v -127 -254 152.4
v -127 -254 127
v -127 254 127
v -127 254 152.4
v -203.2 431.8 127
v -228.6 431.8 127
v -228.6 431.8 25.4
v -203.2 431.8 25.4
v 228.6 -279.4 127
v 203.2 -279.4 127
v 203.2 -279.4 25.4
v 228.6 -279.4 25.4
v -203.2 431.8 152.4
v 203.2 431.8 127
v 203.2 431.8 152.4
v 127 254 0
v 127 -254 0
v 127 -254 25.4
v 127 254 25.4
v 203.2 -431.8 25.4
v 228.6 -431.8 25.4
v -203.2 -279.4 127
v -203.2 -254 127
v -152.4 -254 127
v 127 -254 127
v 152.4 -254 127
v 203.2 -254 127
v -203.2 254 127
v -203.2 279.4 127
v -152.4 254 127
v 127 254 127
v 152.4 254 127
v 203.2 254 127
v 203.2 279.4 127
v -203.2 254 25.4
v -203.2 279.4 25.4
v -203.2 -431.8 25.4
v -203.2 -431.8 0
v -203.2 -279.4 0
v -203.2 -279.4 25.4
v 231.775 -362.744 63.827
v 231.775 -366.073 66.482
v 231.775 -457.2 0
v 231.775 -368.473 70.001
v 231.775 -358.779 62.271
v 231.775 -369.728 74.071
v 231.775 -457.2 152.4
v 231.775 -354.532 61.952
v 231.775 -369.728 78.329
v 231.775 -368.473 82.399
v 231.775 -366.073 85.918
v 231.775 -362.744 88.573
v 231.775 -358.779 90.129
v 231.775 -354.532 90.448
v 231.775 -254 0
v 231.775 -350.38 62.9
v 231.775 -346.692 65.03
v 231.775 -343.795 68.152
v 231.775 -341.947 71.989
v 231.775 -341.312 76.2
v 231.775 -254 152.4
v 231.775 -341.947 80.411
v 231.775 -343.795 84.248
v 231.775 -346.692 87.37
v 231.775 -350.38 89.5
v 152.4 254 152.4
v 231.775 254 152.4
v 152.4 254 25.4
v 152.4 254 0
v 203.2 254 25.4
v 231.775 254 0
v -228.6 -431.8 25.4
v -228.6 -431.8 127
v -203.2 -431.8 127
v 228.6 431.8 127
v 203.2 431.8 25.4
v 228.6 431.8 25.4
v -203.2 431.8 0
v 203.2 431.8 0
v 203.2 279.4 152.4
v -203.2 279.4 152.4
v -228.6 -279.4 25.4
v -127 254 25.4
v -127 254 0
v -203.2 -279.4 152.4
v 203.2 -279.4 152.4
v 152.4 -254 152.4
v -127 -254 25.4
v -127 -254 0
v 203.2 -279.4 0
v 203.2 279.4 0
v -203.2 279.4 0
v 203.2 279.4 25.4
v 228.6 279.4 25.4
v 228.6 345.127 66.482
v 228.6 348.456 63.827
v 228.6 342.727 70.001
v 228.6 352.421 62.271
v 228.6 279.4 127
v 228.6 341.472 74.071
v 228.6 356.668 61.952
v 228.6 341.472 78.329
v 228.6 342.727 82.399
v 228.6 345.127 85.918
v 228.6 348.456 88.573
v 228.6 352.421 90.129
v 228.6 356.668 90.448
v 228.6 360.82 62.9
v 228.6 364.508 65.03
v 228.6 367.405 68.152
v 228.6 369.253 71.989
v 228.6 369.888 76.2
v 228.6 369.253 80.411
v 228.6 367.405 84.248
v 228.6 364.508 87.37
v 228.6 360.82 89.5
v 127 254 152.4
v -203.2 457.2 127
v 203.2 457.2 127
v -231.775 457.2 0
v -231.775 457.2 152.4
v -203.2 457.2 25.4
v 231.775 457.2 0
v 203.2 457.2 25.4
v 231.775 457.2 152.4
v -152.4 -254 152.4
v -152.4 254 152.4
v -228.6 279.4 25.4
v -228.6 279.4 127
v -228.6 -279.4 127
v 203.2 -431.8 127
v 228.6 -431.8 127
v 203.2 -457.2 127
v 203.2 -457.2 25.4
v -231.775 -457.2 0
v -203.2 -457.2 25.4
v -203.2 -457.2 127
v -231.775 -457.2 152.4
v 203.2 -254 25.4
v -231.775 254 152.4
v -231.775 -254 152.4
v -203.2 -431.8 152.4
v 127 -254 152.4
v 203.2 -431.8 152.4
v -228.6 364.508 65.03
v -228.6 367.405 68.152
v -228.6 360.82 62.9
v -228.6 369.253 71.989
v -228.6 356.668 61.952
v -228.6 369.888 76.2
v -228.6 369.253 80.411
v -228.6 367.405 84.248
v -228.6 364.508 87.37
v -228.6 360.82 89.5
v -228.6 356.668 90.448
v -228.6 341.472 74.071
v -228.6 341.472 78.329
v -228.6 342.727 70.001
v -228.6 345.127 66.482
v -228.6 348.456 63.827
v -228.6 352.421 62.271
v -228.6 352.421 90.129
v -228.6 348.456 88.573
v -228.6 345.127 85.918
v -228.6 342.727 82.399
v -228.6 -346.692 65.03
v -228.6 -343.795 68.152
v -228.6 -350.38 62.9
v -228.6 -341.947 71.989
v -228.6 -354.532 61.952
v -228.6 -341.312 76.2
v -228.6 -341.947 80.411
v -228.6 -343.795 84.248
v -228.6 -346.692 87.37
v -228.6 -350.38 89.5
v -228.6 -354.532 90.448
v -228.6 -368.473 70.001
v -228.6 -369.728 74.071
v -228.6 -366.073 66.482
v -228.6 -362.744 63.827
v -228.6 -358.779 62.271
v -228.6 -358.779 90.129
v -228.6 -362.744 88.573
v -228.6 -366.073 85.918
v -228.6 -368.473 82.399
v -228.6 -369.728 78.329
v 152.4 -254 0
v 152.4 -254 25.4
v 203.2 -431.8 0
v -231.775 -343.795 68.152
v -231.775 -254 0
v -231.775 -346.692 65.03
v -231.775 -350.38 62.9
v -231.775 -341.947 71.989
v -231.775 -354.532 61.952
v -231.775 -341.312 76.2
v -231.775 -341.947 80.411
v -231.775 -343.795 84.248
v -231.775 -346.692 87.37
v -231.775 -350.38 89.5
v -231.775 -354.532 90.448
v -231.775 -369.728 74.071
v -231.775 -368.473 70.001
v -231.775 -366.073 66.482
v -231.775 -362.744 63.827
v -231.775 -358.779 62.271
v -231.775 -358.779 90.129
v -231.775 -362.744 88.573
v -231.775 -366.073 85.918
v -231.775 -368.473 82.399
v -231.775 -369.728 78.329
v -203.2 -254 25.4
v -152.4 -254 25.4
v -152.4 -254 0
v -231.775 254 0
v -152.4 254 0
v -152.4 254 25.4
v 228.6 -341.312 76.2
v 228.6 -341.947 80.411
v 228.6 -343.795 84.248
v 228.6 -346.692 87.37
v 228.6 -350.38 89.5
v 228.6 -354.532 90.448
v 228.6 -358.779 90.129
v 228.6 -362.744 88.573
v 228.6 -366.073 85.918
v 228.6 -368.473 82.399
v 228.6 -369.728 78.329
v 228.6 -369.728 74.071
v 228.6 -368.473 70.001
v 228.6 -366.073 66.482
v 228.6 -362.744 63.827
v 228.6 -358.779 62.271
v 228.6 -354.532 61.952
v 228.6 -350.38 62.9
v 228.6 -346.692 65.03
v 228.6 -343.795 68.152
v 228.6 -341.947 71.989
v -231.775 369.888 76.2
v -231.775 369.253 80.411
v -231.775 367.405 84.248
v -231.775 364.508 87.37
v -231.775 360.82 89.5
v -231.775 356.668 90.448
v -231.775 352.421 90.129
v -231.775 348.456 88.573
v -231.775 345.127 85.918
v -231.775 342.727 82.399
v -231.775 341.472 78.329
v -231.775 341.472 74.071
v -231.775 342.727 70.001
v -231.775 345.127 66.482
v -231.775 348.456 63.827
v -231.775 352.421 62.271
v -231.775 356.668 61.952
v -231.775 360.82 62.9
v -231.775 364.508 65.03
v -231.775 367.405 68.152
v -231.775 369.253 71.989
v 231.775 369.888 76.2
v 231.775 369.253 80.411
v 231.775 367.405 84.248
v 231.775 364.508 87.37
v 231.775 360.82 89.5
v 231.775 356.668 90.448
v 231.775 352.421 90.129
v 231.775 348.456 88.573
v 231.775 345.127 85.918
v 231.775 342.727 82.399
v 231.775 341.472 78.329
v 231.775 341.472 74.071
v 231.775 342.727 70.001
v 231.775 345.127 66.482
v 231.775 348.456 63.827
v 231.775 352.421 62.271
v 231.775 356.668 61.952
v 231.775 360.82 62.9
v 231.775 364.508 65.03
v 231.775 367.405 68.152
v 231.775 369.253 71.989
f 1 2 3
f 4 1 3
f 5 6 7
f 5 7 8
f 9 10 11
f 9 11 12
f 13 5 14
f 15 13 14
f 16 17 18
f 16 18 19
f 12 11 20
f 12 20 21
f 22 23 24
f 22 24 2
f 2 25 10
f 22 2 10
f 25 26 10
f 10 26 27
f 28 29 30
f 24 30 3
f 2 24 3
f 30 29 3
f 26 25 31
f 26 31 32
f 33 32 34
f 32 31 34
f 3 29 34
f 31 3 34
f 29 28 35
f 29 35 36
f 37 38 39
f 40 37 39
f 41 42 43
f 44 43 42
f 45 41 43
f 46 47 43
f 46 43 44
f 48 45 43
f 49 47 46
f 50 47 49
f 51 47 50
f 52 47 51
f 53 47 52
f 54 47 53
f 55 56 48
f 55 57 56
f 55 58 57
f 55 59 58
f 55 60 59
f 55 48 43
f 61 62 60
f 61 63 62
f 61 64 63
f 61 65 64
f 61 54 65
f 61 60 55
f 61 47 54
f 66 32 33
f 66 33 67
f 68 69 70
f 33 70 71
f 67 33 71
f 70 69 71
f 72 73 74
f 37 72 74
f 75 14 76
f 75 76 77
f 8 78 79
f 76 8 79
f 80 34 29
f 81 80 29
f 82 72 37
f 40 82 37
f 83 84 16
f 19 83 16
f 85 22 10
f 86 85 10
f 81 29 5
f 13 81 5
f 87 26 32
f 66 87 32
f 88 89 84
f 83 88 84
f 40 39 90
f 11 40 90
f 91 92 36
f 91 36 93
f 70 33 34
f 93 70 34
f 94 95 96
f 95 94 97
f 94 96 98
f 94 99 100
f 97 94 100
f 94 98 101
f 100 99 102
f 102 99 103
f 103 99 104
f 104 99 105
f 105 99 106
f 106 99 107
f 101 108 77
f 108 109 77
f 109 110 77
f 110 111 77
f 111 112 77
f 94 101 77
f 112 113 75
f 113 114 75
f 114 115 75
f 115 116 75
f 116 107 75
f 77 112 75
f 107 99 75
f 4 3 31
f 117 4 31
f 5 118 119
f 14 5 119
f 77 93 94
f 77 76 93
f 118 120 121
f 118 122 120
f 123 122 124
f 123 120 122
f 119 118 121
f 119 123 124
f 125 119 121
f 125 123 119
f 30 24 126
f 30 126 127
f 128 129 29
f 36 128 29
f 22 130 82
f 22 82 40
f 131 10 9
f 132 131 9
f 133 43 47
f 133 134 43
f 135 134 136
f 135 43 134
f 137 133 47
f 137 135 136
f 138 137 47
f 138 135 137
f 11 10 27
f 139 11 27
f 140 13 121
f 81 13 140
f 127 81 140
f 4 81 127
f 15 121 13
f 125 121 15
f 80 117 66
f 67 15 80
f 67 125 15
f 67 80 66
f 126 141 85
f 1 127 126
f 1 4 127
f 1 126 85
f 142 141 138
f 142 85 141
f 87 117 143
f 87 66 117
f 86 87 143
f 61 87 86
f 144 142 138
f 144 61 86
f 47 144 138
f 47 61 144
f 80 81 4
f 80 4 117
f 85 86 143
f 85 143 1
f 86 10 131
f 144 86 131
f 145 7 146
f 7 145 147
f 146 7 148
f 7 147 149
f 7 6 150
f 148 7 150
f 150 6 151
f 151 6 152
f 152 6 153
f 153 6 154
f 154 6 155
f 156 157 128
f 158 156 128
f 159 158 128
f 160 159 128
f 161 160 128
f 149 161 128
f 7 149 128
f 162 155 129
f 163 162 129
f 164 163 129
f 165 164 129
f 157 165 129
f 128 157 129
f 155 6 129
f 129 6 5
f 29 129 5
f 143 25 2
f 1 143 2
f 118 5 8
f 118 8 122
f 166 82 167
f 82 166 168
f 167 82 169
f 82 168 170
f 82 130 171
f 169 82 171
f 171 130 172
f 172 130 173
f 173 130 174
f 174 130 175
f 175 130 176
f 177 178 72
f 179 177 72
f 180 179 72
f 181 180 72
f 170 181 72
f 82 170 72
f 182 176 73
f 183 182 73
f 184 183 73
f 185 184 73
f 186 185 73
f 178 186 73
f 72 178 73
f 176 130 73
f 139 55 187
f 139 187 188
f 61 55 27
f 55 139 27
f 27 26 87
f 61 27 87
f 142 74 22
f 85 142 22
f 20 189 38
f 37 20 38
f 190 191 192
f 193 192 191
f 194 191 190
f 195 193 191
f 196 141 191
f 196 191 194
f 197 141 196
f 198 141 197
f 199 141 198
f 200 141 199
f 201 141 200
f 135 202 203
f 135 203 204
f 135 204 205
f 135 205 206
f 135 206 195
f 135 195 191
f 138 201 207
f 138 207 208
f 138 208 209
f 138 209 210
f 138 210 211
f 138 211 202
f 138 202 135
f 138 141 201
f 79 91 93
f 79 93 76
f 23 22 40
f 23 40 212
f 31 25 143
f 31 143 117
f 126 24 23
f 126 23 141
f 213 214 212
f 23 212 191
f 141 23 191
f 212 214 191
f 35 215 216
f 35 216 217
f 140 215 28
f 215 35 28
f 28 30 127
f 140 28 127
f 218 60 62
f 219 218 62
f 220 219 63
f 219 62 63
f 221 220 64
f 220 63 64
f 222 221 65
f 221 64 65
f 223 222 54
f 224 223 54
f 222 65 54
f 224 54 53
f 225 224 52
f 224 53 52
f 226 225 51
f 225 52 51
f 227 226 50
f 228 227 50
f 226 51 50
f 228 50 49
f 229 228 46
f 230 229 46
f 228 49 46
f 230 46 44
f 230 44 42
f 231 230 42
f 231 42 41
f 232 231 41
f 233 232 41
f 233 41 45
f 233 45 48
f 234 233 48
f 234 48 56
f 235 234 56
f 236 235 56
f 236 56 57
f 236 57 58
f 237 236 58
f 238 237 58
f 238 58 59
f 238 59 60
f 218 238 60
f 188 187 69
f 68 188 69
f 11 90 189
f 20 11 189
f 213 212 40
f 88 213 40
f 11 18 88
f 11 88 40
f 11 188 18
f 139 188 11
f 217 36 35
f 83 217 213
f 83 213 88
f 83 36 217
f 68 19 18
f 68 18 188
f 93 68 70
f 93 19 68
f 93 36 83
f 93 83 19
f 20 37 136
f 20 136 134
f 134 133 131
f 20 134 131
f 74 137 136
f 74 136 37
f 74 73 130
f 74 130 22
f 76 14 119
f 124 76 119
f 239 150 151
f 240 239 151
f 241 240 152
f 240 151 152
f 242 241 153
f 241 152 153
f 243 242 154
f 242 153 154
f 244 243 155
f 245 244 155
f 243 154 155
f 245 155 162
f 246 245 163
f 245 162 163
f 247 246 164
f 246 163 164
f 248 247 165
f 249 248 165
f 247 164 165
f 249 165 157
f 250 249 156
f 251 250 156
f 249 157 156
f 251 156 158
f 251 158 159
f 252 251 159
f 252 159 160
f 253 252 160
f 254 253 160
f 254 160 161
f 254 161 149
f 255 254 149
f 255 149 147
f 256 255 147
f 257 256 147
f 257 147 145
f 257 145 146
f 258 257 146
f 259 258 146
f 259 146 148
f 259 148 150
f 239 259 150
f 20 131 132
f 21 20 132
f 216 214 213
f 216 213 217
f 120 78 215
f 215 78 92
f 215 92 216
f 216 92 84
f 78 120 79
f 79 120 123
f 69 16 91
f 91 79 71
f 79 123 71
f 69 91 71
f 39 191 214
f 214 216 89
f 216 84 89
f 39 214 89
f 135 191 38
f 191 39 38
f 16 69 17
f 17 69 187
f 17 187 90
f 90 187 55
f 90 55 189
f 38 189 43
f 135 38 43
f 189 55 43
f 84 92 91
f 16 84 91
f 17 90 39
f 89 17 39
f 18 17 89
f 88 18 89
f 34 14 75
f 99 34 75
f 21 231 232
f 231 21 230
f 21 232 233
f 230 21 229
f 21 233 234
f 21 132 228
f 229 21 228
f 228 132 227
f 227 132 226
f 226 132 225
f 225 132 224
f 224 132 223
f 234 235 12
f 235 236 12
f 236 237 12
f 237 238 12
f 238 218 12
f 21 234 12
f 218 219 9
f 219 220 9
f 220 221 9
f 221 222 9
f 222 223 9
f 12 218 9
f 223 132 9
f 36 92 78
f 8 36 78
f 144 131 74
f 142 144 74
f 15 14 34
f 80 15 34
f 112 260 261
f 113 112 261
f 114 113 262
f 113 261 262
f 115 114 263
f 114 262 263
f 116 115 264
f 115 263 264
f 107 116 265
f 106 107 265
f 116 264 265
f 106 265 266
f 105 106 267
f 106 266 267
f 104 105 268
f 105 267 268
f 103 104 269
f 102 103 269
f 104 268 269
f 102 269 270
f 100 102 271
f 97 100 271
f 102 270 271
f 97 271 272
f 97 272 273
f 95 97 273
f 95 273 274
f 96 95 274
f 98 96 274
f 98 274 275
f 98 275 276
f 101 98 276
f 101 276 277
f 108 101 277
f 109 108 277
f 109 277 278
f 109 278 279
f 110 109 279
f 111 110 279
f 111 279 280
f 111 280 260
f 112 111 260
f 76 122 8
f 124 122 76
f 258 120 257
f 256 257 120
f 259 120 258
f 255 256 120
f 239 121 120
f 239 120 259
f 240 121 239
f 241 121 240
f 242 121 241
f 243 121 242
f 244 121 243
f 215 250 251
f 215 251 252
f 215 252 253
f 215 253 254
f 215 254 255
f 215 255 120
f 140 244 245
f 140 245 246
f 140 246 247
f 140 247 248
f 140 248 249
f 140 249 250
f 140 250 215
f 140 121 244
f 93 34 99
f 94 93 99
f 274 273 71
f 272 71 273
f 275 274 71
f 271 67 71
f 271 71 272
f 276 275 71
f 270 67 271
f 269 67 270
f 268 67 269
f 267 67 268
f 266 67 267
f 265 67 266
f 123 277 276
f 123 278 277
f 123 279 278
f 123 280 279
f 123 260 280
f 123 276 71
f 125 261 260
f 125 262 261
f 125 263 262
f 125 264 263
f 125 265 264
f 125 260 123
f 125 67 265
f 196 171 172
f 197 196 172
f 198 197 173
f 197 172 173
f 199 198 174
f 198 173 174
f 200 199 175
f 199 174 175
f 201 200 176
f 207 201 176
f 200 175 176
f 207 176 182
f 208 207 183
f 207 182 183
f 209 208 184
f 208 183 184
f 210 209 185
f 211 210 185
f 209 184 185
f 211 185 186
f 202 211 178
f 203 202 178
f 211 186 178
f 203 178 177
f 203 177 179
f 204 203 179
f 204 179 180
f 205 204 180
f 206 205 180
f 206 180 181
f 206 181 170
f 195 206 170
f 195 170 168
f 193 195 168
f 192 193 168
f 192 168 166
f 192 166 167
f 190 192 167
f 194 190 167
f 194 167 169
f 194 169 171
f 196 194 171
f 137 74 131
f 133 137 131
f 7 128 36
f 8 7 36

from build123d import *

# Parameters (mm, degrees)
F0_W      = 406.4
F0_H      = 152.4
F0_W_2    = 25.4
F0_H_2    = 508
F1_DEPTH  = 25.4
F2_W      = 25.4
F2_H      = 25.4
F3_DEPTH  = 101.6
F4_W      = 25.4
F4_H      = 508
F5_DEPTH  = 25.4
F6_W      = 203.2
F6_H      = 152.4
F7_DEPTH  = 3.175
F8_W      = 203.2
F8_H      = 152.4
F9_DEPTH  = 3.175
F10_R     = 14.2875
F11_DEPTH = 463.551


with BuildPart() as f1:
    # F0 (on Top) → F1 (new body)
    with BuildSketch(Plane.XY):
        Polygon((228.6, 457.2), (-228.6, 457.2), (-228.6, 254), (-203.2, 254), (-152.4, 254), (-127, 254), (127, 254), (152.4, 254), (203.2, 254), (228.6, 254), align=None)
        with Locations((0, 355.6)):
            Rectangle(F0_W, F0_H, mode=Mode.SUBTRACT)
        with Locations((-139.7, 0)):
            Rectangle(F0_W_2, F0_H_2)
        with Locations((139.7, 0)):
            Rectangle(F0_W_2, F0_H_2)
        Polygon((-127, -254), (-152.4, -254), (-203.2, -254), (-203.2, -279.4), (203.2, -279.4), (203.2, -254), (152.4, -254), (127, -254), align=None)
        Polygon((-203.2, -279.4), (-203.2, -254), (-228.6, -254), (-228.6, -457.2), (228.6, -457.2), (228.6, -254), (203.2, -254), (203.2, -279.4), (203.2, -431.8), (-203.2, -431.8), align=None)
    extrude(amount=F1_DEPTH)

    # F2 (on face) → F3 (join)
    with BuildSketch(Plane.XY.offset(25.4)):
        with Locations((-215.9, -444.5)):
            Rectangle(F2_W, F2_H)
        with Locations((-215.9, 444.5)):
            Rectangle(F2_W, F2_H)
        with Locations((215.9, 444.5)):
            Rectangle(F2_W, F2_H)
        with Locations((215.9, -444.5)):
            Rectangle(F2_W, F2_H)
        with Locations((-215.9, -266.7)):
            Rectangle(F2_W, F2_H)
        with Locations((-215.9, 266.7)):
            Rectangle(F2_W, F2_H)
        with Locations((215.9, -266.7)):
            Rectangle(F2_W, F2_H)
        with Locations((215.9, 266.7)):
            Rectangle(F2_W, F2_H)
    extrude(amount=F3_DEPTH)

    # F4 (on face) → F5 (join)
    with BuildSketch(Plane.XY.offset(127)):
        Polygon((228.6, 431.8), (228.6, 457.2), (-228.6, 457.2), (-228.6, 431.8), (-203.2, 431.8), (203.2, 431.8), align=None)
        Polygon((228.6, 254), (228.6, 431.8), (203.2, 431.8), (203.2, 279.4), (203.2, 254), align=None)
        Polygon((-203.2, 431.8), (-228.6, 431.8), (-228.6, 254), (-203.2, 254), (-203.2, 279.4), align=None)
        Polygon((203.2, 254), (203.2, 279.4), (-203.2, 279.4), (-203.2, 254), (-152.4, 254), (-127, 254), (127, 254), (152.4, 254), align=None)
        with Locations((139.7, 0)):
            Rectangle(F4_W, F4_H)
        with Locations((-139.7, 0)):
            Rectangle(F4_W, F4_H)
        Polygon((203.2, -254), (152.4, -254), (127, -254), (-127, -254), (-152.4, -254), (-203.2, -254), (-203.2, -279.4), (203.2, -279.4), align=None)
        Polygon((228.6, -254), (203.2, -254), (203.2, -279.4), (203.2, -431.8), (228.6, -431.8), align=None)
        Polygon((-203.2, -279.4), (-203.2, -254), (-228.6, -254), (-228.6, -431.8), (-203.2, -431.8), align=None)
        Polygon((228.6, -457.2), (228.6, -431.8), (203.2, -431.8), (-203.2, -431.8), (-228.6, -431.8), (-228.6, -457.2), align=None)
    extrude(amount=F5_DEPTH)

    # F6 (on face) → F7 (join)
    with BuildSketch(Plane.YZ.offset(228.6)):
        with Locations((-355.6, 76.2)):
            Rectangle(F6_W, F6_H)
        with Locations((355.6, 76.2)):
            Rectangle(F6_W, F6_H)
    extrude(amount=F7_DEPTH)

    # F8 (on face) → F9 (join)
    with BuildSketch(Plane(origin=(-228.6, 0, 0), x_dir=(0, -1, 0), z_dir=(-1, 0, 0))):
        with Locations((-355.6, 76.2)):
            Rectangle(F8_W, F8_H)
        with Locations((355.6, 76.2)):
            Rectangle(F8_W, F8_H)
    extrude(amount=F9_DEPTH)

    # F10 (on face) → F11 (cut, through all)
    with BuildSketch(Plane.YZ.offset(231.775)):
        with Locations((355.6, 76.2)):
            Circle(F10_R)
        with Locations((-355.6, 76.2)):
            Circle(F10_R)
    extrude(amount=-F11_DEPTH, mode=Mode.SUBTRACT)


solid = f1.part
